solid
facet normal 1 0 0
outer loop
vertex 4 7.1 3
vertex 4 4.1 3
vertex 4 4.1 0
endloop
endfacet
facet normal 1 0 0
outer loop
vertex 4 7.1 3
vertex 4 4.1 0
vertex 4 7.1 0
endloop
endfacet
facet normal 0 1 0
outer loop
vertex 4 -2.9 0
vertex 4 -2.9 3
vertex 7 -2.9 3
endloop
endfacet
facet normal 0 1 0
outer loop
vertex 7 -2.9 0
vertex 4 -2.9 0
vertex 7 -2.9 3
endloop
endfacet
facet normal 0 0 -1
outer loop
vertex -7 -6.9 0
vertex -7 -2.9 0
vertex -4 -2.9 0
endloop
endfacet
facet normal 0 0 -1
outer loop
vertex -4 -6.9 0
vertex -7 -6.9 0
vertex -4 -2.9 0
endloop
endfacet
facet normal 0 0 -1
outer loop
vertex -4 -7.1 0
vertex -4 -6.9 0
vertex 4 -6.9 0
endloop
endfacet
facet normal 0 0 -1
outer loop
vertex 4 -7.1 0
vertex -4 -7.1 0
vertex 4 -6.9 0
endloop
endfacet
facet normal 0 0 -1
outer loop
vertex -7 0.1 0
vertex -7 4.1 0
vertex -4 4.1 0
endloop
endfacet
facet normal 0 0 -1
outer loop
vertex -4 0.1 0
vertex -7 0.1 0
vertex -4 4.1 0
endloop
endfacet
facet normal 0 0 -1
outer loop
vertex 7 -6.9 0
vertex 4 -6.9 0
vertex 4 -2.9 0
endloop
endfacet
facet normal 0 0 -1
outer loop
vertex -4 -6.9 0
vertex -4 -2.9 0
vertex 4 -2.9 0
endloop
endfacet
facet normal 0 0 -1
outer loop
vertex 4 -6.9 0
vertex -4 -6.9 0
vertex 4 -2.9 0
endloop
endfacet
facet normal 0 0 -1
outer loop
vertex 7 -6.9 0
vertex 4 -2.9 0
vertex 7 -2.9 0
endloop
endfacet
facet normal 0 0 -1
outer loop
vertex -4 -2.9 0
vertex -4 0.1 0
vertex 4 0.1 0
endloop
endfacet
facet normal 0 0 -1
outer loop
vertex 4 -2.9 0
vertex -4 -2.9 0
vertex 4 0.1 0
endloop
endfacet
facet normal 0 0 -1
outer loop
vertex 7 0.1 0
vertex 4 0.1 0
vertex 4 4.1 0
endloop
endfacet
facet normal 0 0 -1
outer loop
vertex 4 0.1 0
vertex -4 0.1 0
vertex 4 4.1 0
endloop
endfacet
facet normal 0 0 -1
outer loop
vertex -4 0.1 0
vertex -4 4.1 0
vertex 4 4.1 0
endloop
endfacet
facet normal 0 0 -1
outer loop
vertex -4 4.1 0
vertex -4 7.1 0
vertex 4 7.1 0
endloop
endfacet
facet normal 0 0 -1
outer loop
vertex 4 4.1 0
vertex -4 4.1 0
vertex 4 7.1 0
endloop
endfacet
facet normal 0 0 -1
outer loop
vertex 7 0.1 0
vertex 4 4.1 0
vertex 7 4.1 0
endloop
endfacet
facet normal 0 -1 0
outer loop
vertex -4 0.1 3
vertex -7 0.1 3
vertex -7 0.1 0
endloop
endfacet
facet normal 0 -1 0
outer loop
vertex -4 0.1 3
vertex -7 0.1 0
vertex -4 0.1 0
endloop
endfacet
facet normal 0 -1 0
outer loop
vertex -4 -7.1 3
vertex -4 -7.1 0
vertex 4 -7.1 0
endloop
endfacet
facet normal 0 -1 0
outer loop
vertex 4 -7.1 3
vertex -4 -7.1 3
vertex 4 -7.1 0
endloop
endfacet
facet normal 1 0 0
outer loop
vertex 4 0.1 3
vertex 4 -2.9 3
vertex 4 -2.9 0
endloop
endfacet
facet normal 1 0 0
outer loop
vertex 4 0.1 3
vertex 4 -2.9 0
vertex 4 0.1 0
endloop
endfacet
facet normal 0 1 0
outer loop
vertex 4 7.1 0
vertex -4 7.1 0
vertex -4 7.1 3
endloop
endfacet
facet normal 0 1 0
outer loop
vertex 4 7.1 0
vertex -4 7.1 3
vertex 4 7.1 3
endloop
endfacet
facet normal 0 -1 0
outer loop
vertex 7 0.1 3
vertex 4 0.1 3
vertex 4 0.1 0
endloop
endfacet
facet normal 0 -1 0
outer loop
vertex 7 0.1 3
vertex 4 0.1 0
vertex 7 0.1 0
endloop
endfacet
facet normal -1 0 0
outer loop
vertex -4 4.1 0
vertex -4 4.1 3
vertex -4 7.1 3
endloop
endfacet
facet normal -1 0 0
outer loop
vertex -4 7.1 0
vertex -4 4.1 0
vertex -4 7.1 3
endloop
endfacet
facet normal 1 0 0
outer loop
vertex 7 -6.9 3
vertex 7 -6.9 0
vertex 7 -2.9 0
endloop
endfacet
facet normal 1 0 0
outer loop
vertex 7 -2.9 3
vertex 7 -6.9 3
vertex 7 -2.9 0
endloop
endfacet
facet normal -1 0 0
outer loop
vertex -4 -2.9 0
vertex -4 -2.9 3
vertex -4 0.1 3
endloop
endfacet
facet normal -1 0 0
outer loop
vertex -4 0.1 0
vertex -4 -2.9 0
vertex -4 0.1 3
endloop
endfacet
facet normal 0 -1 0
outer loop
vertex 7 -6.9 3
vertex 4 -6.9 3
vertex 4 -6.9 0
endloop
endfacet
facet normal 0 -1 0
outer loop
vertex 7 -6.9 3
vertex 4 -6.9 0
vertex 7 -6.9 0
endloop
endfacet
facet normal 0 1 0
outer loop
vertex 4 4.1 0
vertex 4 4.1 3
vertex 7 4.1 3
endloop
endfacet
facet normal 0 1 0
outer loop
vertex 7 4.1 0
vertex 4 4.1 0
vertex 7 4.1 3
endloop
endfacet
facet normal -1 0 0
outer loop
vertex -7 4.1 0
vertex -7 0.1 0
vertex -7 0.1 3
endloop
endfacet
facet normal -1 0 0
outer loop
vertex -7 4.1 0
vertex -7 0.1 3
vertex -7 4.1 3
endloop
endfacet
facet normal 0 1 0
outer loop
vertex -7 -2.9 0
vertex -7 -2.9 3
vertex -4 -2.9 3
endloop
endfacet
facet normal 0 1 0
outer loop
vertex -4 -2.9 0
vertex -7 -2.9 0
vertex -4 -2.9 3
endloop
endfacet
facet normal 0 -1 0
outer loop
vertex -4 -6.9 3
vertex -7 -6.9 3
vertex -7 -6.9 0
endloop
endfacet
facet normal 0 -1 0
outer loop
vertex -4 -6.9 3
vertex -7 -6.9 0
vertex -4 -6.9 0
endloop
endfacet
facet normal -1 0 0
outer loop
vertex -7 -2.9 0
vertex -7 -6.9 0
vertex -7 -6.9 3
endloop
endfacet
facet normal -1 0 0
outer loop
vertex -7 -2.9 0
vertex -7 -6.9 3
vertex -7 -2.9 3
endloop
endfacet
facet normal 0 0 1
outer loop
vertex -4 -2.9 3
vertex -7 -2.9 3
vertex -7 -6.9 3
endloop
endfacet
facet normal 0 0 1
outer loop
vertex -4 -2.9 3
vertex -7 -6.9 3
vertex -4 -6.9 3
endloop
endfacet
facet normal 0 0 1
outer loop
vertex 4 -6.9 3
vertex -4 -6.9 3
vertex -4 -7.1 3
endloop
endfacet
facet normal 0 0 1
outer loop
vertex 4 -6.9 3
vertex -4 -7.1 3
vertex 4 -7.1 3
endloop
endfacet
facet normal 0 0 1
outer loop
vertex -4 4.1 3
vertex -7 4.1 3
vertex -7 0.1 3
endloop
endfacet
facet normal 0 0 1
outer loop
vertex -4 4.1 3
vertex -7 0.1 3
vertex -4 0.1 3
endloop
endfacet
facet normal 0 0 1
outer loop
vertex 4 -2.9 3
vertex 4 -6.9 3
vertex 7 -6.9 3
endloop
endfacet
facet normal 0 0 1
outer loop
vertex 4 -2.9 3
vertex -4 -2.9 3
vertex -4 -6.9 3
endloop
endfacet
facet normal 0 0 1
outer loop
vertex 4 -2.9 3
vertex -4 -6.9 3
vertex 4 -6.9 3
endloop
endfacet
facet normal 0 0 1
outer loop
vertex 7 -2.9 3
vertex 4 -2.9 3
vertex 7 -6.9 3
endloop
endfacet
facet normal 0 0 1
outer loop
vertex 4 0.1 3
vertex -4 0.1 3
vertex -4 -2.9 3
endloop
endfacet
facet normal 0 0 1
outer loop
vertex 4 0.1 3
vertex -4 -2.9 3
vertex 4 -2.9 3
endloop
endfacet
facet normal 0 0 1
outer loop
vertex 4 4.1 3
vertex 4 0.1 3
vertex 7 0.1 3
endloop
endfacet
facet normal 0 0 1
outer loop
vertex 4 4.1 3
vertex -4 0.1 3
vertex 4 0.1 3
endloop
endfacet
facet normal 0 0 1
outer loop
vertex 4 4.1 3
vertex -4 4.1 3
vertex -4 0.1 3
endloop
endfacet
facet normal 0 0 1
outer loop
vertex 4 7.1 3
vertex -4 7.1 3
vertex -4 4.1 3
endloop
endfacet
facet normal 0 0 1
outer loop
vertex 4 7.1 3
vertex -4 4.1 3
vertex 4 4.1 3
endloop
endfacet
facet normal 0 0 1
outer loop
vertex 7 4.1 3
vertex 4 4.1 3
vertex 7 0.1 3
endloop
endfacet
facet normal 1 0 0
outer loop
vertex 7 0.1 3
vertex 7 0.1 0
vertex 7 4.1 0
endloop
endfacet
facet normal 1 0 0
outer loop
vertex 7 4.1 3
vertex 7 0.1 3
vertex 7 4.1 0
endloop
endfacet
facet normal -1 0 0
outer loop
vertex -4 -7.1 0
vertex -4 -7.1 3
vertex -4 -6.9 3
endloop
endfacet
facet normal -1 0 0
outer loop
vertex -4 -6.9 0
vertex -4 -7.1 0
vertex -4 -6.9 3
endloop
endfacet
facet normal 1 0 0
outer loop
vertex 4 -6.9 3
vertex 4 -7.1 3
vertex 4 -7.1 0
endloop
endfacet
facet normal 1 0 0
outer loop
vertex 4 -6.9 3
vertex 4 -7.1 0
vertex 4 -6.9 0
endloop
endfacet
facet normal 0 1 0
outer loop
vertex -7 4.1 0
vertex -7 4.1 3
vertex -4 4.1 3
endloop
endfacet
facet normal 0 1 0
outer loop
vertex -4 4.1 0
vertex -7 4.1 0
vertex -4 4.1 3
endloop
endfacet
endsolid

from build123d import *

# Parameters (mm, degrees)
SKETCH1_W           = 14
SKETCH1_H           = 14.2
BOSS_EXTRUDE1_DEPTH = 3
SKETCH2_W           = 3
SKETCH2_H           = 3
SKETCH2_H_2         = 0.2
CUT_EXTRUDE1_DEPTH  = 10
SKETCH4_W           = 3
SKETCH4_H           = 3
SKETCH4_H_2         = 0.2
CUT_EXTRUDE2_DEPTH  = 10


with BuildPart() as part:
    # Sketch1 → Boss-Extrude1 (new body)
    with BuildSketch(Plane.XY):
        Rectangle(SKETCH1_W, SKETCH1_H)
    extrude(amount=BOSS_EXTRUDE1_DEPTH)

    # Sketch2 → Cut-Extrude1 (cut)
    with BuildSketch(Plane.XY.offset(3)):
        with Locations((-5.5, 5.6)):
            Rectangle(SKETCH2_W, SKETCH2_H)
        with Locations((-5.5, -1.4)):
            Rectangle(SKETCH2_W, SKETCH2_H)
        with Locations((-5.5, -7)):
            Rectangle(SKETCH2_W, SKETCH2_H_2)
    extrude(amount=-CUT_EXTRUDE1_DEPTH, mode=Mode.SUBTRACT)

    # Sketch4 → Cut-Extrude2 (cut)
    with BuildSketch(Plane.XY.offset(3)):
        with Locations((5.5, 5.6)):
            Rectangle(SKETCH4_W, SKETCH4_H)
        with Locations((5.5, -1.4)):
            Rectangle(SKETCH4_W, SKETCH4_H)
        with Locations((5.5, -7)):
            Rectangle(SKETCH4_W, SKETCH4_H_2)
    extrude(amount=-CUT_EXTRUDE2_DEPTH, mode=Mode.SUBTRACT)


solid = part.part
